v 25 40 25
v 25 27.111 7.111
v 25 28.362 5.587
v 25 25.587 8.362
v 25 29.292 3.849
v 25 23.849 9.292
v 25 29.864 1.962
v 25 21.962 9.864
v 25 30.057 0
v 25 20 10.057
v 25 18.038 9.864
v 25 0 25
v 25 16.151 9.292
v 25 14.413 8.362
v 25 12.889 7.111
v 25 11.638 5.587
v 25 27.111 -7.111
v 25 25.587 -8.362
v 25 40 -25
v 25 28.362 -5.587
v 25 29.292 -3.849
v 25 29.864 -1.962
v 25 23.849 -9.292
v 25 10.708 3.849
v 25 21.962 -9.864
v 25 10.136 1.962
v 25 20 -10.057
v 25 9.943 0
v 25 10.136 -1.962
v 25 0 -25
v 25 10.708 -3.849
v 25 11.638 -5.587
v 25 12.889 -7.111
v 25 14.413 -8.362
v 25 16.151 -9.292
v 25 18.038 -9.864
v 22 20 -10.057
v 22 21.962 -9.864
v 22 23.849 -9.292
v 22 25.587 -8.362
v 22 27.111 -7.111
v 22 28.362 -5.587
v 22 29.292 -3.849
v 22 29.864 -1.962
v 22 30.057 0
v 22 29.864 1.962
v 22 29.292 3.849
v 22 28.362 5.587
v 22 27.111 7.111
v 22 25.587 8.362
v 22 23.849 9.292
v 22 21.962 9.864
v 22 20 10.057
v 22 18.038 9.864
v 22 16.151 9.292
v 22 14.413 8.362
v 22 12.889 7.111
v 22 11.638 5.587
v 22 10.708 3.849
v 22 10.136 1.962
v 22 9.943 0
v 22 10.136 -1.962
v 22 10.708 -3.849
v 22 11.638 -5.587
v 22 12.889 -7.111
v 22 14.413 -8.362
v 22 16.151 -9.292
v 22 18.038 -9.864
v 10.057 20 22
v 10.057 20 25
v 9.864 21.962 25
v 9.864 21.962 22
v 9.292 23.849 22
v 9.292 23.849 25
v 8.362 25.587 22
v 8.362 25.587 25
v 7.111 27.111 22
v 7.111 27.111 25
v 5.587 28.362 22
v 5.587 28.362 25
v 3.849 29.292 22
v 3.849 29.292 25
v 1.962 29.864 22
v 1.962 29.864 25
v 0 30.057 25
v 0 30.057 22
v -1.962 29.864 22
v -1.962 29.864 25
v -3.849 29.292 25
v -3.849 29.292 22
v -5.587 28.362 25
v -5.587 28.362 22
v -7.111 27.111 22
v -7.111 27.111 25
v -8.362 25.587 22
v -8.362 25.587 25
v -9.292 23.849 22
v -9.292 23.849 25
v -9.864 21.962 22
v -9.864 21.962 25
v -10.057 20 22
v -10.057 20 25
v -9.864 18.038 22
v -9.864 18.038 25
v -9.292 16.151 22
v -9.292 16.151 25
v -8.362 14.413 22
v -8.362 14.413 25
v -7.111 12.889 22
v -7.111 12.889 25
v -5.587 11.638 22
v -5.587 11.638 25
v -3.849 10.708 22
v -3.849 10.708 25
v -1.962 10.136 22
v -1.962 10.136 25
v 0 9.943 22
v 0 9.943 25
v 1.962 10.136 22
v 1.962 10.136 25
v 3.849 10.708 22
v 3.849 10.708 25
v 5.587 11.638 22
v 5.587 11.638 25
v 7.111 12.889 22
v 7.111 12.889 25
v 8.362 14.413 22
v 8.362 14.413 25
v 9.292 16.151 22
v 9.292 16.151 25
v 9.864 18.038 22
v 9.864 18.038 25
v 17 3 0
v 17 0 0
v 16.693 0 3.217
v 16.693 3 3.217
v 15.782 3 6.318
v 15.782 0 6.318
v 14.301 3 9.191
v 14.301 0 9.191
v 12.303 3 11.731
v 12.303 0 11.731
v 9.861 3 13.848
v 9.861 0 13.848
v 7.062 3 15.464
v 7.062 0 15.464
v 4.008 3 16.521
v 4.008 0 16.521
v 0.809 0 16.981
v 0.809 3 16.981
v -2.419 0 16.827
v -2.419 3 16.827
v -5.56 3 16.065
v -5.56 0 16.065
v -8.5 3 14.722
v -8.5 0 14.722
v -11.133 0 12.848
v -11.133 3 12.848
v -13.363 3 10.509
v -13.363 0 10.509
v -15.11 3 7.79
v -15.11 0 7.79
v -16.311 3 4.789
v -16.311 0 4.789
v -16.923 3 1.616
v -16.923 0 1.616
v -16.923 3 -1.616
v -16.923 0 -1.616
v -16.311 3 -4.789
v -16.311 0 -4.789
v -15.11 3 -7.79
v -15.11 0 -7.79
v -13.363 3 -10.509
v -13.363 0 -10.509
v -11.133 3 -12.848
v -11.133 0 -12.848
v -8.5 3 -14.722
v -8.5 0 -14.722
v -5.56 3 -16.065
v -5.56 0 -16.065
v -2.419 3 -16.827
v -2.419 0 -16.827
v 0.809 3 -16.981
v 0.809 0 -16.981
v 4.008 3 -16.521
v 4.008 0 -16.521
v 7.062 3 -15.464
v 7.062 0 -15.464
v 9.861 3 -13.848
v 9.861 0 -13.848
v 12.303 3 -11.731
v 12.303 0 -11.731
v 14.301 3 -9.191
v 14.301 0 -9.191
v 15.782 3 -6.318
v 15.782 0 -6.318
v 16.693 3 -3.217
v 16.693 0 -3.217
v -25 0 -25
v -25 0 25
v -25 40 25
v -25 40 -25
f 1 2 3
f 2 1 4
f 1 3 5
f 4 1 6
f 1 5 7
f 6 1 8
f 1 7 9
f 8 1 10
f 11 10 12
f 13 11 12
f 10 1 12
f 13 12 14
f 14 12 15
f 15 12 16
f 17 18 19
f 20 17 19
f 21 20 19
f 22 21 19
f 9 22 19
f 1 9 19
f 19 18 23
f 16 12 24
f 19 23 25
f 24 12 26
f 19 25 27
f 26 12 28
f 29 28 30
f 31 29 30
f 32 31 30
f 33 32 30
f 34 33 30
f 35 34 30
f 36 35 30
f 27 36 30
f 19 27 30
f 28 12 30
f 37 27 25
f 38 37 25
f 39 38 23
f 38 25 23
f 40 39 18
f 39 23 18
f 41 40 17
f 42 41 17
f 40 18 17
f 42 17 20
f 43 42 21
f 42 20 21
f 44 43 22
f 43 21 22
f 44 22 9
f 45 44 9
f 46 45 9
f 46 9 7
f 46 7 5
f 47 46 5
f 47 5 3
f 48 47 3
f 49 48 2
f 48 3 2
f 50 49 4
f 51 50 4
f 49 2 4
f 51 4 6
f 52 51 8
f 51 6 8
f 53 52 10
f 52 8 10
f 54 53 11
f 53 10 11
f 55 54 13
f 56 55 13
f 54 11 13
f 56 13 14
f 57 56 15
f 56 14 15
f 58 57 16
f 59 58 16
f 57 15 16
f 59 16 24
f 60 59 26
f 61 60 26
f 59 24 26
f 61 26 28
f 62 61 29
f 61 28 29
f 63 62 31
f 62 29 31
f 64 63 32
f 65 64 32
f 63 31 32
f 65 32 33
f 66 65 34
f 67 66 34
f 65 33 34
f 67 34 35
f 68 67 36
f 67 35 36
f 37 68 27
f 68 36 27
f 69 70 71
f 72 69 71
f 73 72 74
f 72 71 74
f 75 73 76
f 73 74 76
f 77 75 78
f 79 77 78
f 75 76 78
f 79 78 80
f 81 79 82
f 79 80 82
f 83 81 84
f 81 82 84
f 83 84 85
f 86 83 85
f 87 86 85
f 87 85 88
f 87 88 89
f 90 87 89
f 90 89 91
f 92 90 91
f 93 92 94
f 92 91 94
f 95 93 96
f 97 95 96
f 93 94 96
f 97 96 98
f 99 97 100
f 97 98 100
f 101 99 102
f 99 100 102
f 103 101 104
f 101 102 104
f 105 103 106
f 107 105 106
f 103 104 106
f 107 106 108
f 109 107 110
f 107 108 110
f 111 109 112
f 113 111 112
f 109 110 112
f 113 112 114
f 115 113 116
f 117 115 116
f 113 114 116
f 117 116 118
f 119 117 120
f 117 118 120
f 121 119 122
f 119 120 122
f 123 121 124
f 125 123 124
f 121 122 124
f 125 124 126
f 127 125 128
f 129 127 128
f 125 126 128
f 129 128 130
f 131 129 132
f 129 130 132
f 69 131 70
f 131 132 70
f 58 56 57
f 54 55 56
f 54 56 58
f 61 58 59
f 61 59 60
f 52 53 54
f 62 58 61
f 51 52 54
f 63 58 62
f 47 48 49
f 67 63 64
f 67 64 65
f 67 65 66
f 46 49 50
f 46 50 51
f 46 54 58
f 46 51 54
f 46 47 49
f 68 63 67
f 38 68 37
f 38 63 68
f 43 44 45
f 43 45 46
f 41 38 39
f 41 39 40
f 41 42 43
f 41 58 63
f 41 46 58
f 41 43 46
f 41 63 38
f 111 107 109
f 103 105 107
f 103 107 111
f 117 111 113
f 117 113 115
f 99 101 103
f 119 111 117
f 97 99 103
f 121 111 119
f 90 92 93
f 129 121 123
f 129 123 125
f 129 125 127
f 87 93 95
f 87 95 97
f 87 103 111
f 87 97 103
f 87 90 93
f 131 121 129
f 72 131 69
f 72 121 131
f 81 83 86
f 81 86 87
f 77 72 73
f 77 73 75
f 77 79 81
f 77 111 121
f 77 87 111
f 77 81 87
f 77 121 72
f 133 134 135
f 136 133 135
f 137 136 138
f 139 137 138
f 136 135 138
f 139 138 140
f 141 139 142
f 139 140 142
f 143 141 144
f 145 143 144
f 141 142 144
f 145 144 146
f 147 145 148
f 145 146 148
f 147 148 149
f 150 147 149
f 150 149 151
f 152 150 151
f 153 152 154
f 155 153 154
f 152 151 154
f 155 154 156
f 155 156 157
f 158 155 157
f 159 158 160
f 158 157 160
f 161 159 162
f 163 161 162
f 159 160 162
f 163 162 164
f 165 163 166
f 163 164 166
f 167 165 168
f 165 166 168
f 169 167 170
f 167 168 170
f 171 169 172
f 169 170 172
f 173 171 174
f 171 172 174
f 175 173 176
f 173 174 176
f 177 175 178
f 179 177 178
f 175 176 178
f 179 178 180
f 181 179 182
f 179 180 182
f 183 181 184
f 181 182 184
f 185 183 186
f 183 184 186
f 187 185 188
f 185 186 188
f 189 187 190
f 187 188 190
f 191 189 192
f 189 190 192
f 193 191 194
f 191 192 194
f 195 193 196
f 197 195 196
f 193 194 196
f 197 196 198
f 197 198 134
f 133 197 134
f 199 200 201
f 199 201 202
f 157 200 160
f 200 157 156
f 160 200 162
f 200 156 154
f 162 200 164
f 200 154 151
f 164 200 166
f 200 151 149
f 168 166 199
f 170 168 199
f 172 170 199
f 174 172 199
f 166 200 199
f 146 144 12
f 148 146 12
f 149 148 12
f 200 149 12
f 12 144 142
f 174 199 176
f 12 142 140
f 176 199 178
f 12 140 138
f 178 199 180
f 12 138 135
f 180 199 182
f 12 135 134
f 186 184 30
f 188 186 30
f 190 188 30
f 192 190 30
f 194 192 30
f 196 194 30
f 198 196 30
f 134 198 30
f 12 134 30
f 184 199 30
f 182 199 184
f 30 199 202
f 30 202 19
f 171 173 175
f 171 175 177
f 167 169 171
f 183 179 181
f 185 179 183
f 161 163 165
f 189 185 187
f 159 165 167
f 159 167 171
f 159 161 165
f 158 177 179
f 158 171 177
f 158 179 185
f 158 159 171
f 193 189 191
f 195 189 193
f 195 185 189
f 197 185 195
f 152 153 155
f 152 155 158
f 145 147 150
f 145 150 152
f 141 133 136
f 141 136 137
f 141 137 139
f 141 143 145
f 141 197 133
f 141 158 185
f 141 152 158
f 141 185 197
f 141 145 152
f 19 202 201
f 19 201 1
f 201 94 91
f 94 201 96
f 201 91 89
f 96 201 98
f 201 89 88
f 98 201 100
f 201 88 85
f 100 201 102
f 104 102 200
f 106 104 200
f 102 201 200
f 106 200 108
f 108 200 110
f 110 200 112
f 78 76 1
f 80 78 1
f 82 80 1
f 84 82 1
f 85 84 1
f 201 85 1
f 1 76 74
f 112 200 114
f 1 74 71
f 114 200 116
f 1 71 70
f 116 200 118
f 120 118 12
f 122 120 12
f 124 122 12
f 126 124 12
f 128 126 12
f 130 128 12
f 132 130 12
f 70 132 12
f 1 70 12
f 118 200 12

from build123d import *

# Parameters (mm, degrees)
SKETCH1_W           = 50
SKETCH1_H           = 50
BOSS_EXTRUDE1_DEPTH = 40
SKETCH5_R           = 10.057084534
CUT_EXTRUDE1_DEPTH  = 3
SKETCH4_R           = 10.057084534
CUT_EXTRUDE2_DEPTH  = 3
SKETCH2_R           = 17
CUT_EXTRUDE3_DEPTH  = 3


with BuildPart() as part:
    # Sketch1 → Boss-Extrude1 (new body)
    with BuildSketch(Plane(origin=(0, 0, 0), x_dir=(1, 0, 0), z_dir=(0, 1, 0))):
        Rectangle(SKETCH1_W, SKETCH1_H)
    extrude(amount=BOSS_EXTRUDE1_DEPTH)

    # Sketch5 → Cut-Extrude1 (cut)
    with BuildSketch(Plane(origin=(25, 0, 0), x_dir=(0, 0, -1), z_dir=(1, 0, 0))):
        with Locations((0, 20)):
            Circle(SKETCH5_R)
    extrude(amount=-CUT_EXTRUDE1_DEPTH, mode=Mode.SUBTRACT)

    # Sketch4 → Cut-Extrude2 (cut)
    with BuildSketch(Plane.XY.offset(25)):
        with Locations((0, 20)):
            Circle(SKETCH4_R)
    extrude(amount=-CUT_EXTRUDE2_DEPTH, mode=Mode.SUBTRACT)

    # Sketch2 → Cut-Extrude3 (cut)
    with BuildSketch(Plane.XZ):
        Circle(SKETCH2_R)
    extrude(amount=-CUT_EXTRUDE3_DEPTH, mode=Mode.SUBTRACT)


solid = part.part
